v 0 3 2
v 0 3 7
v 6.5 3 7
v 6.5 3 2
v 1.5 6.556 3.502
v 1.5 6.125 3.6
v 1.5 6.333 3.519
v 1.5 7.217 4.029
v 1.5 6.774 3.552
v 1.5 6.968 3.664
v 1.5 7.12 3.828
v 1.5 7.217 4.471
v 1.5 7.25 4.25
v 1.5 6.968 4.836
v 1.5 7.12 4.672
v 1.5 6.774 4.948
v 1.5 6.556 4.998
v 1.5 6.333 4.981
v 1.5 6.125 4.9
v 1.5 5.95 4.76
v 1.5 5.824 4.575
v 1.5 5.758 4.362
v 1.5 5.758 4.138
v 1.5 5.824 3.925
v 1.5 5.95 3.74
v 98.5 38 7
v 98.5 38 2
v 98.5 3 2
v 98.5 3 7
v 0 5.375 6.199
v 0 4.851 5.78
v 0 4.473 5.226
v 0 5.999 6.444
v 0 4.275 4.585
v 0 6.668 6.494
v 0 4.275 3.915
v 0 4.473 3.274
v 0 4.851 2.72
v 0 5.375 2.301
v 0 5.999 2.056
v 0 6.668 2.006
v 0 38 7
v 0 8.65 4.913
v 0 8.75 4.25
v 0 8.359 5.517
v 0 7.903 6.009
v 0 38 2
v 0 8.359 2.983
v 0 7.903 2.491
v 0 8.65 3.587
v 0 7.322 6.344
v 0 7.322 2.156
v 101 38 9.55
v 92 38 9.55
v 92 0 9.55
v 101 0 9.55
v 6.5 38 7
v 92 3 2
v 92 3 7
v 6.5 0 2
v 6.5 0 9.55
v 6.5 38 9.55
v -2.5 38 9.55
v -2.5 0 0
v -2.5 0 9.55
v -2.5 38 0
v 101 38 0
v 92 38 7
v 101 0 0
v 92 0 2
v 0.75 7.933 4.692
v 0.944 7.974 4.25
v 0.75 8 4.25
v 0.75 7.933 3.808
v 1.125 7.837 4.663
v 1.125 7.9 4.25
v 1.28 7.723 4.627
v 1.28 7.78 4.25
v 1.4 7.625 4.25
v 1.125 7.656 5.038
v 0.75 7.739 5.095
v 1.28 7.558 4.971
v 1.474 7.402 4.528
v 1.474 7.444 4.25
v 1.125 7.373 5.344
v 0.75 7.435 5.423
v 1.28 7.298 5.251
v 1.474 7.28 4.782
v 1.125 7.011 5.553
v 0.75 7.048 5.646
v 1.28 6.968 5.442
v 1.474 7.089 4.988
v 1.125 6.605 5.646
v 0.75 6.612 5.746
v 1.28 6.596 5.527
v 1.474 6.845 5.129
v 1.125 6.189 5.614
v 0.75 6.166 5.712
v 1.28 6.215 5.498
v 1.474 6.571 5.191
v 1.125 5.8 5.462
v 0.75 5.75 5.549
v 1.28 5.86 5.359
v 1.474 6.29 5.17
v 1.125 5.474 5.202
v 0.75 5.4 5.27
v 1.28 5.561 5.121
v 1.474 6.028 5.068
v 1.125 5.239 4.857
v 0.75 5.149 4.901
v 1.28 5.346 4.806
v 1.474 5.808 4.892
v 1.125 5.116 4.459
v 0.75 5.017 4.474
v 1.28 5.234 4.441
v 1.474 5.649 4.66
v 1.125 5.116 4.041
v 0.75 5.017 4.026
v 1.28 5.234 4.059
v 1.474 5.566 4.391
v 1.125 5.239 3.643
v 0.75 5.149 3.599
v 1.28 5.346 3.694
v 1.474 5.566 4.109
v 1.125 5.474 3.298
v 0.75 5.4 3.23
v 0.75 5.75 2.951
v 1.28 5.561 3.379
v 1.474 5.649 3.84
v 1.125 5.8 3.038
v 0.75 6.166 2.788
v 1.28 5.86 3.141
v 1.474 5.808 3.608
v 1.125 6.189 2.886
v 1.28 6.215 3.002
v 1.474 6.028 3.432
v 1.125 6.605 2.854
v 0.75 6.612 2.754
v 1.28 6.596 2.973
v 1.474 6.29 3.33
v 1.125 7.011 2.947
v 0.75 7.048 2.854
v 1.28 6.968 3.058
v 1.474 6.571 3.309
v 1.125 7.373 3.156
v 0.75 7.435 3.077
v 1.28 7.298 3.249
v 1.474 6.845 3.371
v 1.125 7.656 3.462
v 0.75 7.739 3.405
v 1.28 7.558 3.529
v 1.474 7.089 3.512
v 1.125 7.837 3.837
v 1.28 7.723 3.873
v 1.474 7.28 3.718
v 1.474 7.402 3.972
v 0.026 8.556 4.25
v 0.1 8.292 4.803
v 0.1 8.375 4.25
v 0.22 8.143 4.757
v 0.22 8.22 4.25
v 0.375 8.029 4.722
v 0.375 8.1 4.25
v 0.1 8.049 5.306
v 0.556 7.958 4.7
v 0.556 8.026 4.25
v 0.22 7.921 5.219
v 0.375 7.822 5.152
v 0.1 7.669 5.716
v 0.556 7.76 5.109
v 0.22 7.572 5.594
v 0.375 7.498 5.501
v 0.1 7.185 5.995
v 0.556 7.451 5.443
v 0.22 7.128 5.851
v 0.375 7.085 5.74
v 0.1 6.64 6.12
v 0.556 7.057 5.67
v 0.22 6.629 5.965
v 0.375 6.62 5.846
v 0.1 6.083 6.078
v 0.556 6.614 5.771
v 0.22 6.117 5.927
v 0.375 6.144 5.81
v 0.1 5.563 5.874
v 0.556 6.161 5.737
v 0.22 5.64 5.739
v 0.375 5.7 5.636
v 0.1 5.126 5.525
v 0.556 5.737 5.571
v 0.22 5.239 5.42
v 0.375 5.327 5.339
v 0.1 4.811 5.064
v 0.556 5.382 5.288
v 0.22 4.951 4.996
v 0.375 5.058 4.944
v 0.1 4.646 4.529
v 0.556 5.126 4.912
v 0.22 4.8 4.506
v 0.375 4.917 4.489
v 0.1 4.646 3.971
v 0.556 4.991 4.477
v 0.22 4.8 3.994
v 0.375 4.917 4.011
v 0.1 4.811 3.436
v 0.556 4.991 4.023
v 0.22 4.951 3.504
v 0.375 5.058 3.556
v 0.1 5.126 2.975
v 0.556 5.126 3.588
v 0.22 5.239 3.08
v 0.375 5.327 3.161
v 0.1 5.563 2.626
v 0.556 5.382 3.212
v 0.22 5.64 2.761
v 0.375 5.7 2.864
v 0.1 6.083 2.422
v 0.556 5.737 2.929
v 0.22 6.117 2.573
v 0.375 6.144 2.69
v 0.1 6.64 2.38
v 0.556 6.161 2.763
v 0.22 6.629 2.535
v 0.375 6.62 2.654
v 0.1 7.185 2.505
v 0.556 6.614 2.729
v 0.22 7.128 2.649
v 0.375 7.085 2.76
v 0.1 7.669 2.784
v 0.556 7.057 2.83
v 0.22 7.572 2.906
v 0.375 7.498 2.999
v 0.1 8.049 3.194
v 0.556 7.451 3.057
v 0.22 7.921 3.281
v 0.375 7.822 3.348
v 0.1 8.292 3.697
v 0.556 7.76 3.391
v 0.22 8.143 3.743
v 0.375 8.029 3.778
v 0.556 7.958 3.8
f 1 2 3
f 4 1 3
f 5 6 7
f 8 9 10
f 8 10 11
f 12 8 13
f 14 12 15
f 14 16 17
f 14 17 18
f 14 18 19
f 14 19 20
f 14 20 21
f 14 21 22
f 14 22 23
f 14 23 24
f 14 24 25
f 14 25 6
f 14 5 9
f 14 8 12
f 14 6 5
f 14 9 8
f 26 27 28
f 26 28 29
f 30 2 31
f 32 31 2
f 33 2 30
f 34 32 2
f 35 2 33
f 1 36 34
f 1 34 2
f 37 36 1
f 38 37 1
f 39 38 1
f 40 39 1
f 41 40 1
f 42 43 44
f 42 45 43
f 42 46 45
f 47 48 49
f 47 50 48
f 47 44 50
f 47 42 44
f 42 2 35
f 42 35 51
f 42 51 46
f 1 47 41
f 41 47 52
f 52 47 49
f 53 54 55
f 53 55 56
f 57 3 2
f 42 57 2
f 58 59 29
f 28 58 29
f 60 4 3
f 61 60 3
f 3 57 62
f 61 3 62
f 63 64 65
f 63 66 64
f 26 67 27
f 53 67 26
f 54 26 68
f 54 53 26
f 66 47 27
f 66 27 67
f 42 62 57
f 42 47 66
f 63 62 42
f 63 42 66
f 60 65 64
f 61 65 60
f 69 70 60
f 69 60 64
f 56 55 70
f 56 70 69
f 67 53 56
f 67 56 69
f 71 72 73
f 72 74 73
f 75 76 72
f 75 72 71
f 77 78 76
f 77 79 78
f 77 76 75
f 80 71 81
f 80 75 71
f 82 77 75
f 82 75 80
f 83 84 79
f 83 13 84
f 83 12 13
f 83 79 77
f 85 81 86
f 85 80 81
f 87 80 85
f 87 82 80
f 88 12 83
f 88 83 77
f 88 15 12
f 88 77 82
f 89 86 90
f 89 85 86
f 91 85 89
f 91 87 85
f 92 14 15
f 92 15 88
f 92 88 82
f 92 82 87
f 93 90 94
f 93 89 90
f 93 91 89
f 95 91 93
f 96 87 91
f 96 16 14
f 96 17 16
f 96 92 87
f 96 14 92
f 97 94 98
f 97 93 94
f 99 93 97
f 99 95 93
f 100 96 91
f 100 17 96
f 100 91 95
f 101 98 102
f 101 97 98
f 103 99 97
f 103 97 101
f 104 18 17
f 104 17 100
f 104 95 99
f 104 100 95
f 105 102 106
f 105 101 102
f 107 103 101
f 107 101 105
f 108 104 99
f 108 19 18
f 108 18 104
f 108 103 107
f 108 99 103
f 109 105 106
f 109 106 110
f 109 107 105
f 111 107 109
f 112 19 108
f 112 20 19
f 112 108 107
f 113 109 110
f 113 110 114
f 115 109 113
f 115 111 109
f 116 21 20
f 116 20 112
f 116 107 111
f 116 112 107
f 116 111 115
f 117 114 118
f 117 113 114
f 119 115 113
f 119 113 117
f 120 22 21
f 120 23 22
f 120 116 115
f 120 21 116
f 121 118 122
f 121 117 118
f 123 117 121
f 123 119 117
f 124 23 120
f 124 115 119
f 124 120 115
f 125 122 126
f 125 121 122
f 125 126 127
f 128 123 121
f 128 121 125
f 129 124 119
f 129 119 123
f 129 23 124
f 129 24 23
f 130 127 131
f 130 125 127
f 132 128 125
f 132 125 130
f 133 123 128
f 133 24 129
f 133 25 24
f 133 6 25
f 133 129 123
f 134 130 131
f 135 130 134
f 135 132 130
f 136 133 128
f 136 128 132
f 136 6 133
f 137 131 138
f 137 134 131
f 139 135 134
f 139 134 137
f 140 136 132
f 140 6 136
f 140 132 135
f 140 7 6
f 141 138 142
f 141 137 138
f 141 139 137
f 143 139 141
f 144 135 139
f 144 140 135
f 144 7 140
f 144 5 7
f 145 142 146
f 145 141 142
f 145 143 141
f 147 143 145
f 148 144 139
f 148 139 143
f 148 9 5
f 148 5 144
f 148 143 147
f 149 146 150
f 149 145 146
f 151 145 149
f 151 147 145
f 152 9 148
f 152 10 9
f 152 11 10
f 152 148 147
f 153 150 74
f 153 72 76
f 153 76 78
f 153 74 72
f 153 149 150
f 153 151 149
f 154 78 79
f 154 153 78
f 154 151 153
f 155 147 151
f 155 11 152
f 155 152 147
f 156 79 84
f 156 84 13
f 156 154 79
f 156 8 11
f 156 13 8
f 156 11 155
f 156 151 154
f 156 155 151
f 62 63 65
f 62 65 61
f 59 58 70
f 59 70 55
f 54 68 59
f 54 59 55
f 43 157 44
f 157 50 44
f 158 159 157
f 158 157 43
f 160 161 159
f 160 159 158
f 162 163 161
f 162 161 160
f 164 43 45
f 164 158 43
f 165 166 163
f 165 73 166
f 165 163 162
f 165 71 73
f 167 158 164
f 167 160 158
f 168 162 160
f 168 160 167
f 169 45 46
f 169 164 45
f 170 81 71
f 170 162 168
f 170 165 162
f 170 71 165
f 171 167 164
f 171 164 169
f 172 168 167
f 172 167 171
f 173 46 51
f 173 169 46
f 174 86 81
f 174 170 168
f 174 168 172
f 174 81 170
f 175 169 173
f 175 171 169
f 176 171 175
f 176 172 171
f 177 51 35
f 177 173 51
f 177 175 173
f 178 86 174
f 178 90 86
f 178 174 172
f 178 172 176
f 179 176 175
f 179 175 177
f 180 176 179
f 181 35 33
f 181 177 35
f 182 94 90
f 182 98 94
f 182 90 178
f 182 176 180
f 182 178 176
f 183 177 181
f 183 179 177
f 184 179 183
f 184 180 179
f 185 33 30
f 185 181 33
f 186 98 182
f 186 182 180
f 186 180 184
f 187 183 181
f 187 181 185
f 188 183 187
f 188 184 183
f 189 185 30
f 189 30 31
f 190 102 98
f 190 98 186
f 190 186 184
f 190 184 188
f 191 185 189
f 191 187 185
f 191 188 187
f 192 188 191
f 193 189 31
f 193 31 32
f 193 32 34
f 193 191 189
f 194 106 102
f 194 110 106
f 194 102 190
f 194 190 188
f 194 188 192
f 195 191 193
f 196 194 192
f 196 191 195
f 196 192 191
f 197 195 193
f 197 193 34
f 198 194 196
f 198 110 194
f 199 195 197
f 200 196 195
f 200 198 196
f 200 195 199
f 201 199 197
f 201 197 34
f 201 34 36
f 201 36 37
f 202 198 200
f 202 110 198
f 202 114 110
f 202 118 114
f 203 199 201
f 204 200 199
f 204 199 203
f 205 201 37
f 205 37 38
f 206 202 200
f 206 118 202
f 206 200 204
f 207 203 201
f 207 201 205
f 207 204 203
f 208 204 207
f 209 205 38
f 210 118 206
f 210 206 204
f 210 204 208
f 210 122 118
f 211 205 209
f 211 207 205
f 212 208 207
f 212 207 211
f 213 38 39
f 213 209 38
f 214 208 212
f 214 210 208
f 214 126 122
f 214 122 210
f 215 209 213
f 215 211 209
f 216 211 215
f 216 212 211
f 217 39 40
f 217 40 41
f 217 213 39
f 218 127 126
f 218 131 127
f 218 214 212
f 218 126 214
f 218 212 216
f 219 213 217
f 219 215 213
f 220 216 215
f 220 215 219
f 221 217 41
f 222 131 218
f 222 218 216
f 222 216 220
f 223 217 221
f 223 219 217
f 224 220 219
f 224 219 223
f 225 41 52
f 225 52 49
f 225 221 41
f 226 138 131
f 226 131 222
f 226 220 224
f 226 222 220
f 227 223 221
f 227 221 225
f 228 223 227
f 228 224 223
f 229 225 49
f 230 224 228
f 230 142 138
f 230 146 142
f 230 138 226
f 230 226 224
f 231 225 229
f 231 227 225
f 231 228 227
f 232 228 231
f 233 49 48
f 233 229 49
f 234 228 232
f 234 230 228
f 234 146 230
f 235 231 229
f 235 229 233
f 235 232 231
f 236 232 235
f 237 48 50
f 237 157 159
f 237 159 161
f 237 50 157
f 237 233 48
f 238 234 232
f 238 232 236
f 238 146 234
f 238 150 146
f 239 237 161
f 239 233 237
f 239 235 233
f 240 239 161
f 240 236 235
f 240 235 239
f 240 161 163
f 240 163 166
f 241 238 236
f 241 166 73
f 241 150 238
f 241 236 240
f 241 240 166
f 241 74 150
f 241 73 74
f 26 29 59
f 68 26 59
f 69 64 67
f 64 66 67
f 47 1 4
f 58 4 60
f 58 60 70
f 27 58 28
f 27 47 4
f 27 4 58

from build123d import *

# Parameters (mm, degrees)
F0_W     = 98.5
F0_H     = 38
F1_DEPTH = 2
F3_DEPTH = 35
F4_W     = 9
F4_H     = 9.55
F5_DEPTH = 3
F6_R     = 1.5
F7_DEPTH = 1.5
F8_R     = 0.74999


# Not quite as in the source:
# - a fillet or chamfer is up to 0.001 mm smaller than in the source, because OpenCascade refuses the exact size


with BuildPart() as f1:
    # F0 (on Top) → F1 (new body)
    with BuildSketch(Plane.XY):
        with Locations((49.25, 19)):
            Rectangle(F0_W, F0_H)
    extrude(amount=F1_DEPTH)

    # F2 (on face) → F3 (join)
    with BuildSketch(Plane(origin=(0, 38, 0), x_dir=(-1, 0, 0), z_dir=(0, 1, 0))):
        Polygon((-101, 0), (-98.5, 0), (-98.5, 7), (-92, 7), (-92, 9.55), (-101, 9.55), align=None)
        Polygon((0, 7), (0, 0), (2.5, 0), (2.5, 9.55), (-6.5, 9.55), (-6.5, 7), align=None)
    extrude(amount=-F3_DEPTH)

    # F4 (on face) → F5 (join)
    with BuildSketch(Plane.XZ.offset(-3)):
        with Locations((2, 4.775)):
            Rectangle(F4_W, F4_H)
        with Locations((96.5, 4.775)):
            Rectangle(F4_W, F4_H)
    extrude(amount=F5_DEPTH)

    # F6 (on face) → F7 (join)
    with BuildSketch(Plane.YZ):
        with Locations((6.5, 4.25)):
            Circle(F6_R)
    extrude(amount=F7_DEPTH)

    # F8 (radius 0.75 in the source; OpenCascade refuses exactly that, so slightly less here)
    f8_edges = [f1.edges().sort_by_distance(p)[0] for p in [
        (1.5, 5, 4.25),
        (0, 5, 4.25),
    ]]
    fillet(f8_edges, radius=F8_R)


solid = f1.part
